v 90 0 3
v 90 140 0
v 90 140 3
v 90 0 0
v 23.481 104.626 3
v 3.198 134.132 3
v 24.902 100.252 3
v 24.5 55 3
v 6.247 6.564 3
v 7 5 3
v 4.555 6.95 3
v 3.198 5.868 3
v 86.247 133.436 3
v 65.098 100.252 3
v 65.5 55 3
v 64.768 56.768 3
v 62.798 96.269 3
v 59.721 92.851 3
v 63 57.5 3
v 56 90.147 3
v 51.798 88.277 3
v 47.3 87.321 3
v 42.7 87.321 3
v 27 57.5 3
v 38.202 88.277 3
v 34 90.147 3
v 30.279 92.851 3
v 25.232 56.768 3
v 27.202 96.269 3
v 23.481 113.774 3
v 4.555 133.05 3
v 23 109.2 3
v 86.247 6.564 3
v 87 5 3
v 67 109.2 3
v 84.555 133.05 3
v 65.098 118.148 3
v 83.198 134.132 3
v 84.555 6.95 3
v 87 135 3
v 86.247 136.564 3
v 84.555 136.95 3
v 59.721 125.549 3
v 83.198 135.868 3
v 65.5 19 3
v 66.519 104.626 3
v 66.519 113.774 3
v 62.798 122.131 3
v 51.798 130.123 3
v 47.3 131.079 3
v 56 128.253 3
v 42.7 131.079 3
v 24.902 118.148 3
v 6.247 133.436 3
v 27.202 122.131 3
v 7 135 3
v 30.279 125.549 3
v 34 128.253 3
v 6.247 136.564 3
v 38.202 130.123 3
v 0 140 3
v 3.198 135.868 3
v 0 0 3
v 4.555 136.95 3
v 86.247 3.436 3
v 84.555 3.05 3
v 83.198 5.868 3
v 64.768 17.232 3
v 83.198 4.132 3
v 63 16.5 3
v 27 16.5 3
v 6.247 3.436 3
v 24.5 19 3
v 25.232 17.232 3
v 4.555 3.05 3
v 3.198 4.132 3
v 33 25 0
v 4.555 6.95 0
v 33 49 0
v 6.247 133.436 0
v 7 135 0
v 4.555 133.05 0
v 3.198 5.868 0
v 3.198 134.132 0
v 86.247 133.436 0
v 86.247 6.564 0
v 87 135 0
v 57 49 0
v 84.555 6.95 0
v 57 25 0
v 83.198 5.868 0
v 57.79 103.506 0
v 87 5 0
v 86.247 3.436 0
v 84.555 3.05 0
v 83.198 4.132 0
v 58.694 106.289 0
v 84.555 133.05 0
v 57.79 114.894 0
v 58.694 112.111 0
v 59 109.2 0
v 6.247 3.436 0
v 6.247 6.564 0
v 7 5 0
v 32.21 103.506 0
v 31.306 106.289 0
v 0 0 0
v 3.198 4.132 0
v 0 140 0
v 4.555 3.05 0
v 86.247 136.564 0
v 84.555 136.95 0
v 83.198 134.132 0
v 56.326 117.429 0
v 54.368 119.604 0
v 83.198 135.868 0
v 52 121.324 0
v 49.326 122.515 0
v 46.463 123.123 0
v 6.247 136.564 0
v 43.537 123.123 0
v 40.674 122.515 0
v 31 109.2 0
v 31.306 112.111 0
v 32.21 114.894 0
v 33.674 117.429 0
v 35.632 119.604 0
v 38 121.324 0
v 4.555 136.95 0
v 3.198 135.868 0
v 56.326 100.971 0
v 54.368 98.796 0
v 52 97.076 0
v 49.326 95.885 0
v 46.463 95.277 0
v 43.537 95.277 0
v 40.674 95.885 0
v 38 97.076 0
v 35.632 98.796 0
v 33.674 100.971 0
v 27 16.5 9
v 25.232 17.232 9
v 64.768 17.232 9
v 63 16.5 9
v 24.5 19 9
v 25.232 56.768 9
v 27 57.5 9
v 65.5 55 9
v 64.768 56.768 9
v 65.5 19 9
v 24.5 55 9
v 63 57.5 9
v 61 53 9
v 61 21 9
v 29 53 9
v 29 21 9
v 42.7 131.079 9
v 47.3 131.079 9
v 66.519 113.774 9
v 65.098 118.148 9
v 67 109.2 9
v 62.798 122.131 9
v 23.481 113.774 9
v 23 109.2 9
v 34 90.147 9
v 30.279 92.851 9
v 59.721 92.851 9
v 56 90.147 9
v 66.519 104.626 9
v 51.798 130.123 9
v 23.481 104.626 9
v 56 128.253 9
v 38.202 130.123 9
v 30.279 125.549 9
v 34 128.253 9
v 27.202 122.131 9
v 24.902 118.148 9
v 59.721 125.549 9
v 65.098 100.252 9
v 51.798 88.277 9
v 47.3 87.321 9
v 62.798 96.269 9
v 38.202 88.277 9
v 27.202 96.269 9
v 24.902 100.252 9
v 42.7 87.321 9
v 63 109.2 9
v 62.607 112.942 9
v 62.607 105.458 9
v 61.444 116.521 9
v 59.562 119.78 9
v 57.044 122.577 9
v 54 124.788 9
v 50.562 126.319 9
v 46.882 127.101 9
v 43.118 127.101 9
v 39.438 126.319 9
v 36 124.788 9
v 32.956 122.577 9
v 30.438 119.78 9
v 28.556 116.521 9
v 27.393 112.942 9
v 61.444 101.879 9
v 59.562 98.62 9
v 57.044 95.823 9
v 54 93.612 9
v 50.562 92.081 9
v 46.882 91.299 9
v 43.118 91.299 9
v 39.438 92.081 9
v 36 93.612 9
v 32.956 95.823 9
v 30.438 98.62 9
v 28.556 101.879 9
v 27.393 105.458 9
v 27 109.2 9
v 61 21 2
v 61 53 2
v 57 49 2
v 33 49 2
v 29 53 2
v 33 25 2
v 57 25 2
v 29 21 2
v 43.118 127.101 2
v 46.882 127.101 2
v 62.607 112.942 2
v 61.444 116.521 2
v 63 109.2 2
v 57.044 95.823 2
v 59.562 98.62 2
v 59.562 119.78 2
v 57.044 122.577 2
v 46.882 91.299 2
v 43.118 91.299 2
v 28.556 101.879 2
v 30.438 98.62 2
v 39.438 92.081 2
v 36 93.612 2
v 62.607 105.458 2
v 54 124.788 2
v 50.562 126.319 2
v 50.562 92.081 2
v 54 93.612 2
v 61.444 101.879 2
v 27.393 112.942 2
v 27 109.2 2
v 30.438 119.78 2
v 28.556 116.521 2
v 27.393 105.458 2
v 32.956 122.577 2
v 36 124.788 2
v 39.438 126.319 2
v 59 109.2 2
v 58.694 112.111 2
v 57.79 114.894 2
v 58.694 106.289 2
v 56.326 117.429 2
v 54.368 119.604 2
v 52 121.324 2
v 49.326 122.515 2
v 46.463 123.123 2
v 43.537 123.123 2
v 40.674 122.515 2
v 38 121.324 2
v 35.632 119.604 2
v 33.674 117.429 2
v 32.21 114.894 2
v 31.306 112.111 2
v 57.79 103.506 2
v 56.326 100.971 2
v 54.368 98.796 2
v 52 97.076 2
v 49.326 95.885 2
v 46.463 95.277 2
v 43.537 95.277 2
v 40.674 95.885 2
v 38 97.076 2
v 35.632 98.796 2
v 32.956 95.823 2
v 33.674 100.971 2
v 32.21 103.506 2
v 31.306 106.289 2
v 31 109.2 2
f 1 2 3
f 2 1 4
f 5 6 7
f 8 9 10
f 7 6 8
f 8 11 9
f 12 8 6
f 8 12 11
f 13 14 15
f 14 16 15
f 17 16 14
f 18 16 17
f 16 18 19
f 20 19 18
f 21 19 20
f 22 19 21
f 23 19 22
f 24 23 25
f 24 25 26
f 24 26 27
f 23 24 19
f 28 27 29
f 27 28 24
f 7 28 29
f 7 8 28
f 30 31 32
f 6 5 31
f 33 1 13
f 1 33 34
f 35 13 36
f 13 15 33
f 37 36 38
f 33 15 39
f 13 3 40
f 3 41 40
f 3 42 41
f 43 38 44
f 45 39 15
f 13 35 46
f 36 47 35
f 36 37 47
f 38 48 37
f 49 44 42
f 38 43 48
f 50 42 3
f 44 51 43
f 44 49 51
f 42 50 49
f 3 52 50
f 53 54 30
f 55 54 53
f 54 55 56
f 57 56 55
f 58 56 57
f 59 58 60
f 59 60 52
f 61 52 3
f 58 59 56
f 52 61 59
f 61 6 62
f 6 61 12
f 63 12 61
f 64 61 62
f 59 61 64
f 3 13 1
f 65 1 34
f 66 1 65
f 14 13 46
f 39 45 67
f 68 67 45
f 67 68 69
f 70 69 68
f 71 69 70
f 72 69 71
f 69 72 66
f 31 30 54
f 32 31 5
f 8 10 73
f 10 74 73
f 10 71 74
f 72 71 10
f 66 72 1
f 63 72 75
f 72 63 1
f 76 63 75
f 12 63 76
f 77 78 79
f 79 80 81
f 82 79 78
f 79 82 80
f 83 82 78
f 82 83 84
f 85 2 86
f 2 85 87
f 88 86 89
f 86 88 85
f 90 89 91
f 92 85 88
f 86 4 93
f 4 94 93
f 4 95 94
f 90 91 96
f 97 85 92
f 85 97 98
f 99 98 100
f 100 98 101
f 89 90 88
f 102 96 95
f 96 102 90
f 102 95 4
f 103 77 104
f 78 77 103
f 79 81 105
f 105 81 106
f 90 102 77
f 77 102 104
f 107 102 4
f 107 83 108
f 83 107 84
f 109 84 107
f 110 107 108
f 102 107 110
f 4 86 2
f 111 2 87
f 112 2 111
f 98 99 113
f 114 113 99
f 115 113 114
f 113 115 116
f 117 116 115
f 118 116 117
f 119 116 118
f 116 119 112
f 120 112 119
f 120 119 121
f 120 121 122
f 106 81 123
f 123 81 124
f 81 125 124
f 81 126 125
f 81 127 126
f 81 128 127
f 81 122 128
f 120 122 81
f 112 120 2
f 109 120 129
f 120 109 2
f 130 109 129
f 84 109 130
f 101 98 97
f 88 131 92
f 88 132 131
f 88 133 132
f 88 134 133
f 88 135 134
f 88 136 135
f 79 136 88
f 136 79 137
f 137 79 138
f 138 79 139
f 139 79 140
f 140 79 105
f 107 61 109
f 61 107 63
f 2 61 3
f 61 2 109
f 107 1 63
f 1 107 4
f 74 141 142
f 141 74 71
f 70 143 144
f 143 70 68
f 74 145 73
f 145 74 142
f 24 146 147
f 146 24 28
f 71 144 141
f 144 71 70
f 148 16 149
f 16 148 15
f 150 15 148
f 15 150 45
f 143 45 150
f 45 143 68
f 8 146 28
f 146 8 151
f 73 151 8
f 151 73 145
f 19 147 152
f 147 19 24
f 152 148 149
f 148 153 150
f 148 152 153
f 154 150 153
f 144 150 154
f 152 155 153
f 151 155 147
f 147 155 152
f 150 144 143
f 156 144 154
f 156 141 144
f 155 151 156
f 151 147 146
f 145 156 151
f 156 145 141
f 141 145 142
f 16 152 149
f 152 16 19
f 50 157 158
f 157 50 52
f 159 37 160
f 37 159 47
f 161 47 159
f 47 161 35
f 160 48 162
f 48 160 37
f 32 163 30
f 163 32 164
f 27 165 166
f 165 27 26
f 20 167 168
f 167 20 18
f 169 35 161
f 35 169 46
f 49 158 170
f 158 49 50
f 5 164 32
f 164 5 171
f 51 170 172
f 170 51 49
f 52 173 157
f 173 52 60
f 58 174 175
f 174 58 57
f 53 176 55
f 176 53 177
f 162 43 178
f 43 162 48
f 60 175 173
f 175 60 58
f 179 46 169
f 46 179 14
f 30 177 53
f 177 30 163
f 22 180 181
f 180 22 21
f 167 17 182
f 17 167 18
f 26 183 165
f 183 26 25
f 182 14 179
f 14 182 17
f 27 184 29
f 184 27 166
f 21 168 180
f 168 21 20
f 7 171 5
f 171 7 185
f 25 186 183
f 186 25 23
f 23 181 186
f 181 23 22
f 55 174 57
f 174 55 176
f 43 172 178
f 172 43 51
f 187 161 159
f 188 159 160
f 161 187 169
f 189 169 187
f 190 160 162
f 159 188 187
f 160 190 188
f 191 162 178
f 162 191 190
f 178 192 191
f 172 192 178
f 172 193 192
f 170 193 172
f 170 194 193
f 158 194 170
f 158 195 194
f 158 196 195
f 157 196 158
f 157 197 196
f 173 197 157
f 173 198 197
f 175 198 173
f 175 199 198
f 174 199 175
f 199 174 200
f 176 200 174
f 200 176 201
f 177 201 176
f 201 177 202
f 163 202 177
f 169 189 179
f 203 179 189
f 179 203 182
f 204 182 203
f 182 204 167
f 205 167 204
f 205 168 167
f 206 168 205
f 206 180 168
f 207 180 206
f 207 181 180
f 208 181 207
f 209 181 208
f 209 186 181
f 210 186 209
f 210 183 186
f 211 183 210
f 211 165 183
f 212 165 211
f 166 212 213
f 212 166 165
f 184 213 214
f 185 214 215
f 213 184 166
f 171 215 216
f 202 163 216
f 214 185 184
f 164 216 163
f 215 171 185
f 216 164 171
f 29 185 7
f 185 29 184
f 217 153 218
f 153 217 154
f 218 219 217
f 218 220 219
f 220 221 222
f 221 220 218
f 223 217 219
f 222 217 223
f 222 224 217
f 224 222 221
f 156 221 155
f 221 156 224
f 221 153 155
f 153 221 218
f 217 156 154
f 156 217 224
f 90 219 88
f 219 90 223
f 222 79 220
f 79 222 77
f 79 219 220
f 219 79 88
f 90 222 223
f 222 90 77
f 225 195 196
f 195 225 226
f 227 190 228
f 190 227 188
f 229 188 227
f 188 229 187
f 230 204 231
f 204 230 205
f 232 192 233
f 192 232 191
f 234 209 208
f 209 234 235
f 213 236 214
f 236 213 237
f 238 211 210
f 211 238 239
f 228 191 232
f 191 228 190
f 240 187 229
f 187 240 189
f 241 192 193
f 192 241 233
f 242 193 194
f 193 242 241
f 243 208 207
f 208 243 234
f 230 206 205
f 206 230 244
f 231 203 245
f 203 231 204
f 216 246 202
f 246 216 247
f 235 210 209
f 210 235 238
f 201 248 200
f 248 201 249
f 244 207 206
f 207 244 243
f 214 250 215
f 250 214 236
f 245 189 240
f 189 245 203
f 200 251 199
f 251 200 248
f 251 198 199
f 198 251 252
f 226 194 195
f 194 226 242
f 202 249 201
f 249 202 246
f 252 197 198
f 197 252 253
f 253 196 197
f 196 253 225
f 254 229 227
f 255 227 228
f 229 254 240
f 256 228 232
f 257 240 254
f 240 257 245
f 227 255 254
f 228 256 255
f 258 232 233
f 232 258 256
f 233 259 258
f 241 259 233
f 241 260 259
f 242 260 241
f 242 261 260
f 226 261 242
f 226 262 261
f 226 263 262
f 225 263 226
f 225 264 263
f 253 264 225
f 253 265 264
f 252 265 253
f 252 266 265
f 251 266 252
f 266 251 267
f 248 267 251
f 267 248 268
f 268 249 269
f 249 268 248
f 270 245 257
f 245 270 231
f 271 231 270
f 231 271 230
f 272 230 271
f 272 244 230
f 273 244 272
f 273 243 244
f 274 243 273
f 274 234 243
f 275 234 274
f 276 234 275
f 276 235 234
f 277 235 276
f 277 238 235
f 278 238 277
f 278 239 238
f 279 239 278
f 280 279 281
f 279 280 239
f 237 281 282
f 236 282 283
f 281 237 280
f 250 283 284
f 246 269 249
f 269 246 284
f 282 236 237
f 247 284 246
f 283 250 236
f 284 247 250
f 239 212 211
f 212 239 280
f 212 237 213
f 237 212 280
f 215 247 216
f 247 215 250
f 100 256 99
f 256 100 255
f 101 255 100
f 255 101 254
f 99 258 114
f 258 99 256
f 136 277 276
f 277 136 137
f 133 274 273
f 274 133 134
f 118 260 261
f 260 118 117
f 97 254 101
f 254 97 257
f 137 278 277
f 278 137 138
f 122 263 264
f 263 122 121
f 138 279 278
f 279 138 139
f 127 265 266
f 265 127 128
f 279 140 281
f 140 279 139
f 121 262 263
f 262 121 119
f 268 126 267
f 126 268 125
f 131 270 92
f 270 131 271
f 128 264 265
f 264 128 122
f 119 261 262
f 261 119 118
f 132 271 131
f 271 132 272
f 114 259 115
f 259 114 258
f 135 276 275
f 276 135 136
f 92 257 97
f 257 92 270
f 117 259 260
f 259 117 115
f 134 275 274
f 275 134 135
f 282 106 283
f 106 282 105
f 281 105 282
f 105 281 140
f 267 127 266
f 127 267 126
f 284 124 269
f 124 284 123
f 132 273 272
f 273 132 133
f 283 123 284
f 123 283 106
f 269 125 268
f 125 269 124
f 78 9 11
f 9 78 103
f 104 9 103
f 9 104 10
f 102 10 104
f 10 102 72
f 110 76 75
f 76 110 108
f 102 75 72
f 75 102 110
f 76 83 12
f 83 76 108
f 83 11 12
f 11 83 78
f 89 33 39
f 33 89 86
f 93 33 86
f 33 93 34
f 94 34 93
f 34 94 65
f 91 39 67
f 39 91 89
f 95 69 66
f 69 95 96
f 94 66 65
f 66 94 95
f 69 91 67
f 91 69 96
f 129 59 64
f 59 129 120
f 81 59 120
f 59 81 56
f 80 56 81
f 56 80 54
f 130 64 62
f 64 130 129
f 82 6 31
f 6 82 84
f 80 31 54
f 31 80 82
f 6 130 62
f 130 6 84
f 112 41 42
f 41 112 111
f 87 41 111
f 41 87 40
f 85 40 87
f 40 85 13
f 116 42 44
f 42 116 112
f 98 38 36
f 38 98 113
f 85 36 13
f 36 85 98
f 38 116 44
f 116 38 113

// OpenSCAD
// file: params.scad
// Ansible widget cases
//
// Params: sets the we want
// -----------------------------------------------------------------------------

// Overall case
CASE_WIDTH = 90;
CASE_LENGTH = 140;
CASE_HEIGHT = 55;
WALL_THICKNESS = 3;
FLOOR_THICKNESS = WALL_THICKNESS;

// -----------------------------------------------------------------------------

// Front door
FRONT_DOOR_THICKNESS = 3;
FRONT_DOOR_INSET = 1;  // how much gap to give
FRONT_DOOR_OFFSET_Y = 4; // how far in from the edge
FRONT_DOOR_WIDTH = CASE_WIDTH - WALL_THICKNESS - FRONT_DOOR_INSET;
FRONT_DOOR_HEIGHT = CASE_HEIGHT - (WALL_THICKNESS * 2) + (FRONT_DOOR_INSET * 2);

// -----------------------------------------------------------------------------

// Pi shelf
SHELF_THICKNESS = WALL_THICKNESS - 1;
SHELF_Y = 52;
SHELF_LENGTH = 40;
SHELF_HEIGHT = 28;
SHELF_PEG_OFFSET_X = 3.5;
SHELF_PEG_OFFSET_Y = 3.0;
SHELF_PEG_HEIGHT = 8;
SHELF_PEG_RADIUS_BASE = 2.5;
SHELF_PEG_RADIUS_TOP = 1.5;

// -----------------------------------------------------------------------------

// Lid
LID_THICKNESS = WALL_THICKNESS;
DOCK_BORDER_HEIGHT = 9;
DOCK_BORDER_THICKNESS = 4;
DOCK_INSET = 2;

// Lid ridge
RIDGE_THICKNESS = WALL_THICKNESS * 2;
RIDGE_PEG_HEIGHT = 6;
RIDGE_PEG_RADIUS_BASE = 2.5;
RIDGE_PEG_RADIUS_TOP = 1.5;
RIDGE_PEG_RADIUS_HOLE = 2;
RIDGE_PEG_OFFSET = 5;

// -----------------------------------------------------------------------------

// General mount
MOUNT_HEIGHT = 15;
MOUNT_THICKNESS = 3;

// Selector dock
SELECTOR_DOCK_Y = CASE_LENGTH * .78;
SELECTOR_DOCK_RADIUS = 18;
SELECTOR_DOCK_BORDER_RADIUS = SELECTOR_DOCK_RADIUS + DOCK_BORDER_THICKNESS;
SELECTOR_HOLE_OFFSET = DOCK_BORDER_THICKNESS;
SELECTOR_HOLE_SIZE = SELECTOR_DOCK_RADIUS - SELECTOR_HOLE_OFFSET;

// Selector mount
SELECTOR_MOUNT_OFFSET = 0.5;
SELECTOR_MOUNT_RADIUS = SELECTOR_DOCK_RADIUS - SELECTOR_MOUNT_OFFSET;
SELECTOR_HOLE_RADIUS = SELECTOR_MOUNT_RADIUS - SELECTOR_HOLE_OFFSET;
SELECTOR_GRIP_HEIGHT = 5;
SELECTOR_GRIP_THICKNESS = 7;

// Widget dock
WIDGET_DOCK_Y = CASE_LENGTH * .15;
WIDGET_DOCK_SIZE = 32;
WIDGET_BORDER_RADIUS = 5/2;
WIDGET_HOLE_OFFSET = DOCK_BORDER_THICKNESS * 2;
WIDGET_HOLE_SIZE = WIDGET_DOCK_SIZE - WIDGET_HOLE_OFFSET;

// -----------------------------------------------------------------------------

// Pi
PI_COLOR = [0.3, 0.4, 0.3];
PI_Y = SHELF_Y + 5;
PI_WIDTH = 66.04;
PI_LENGTH = 30.48;
PI_DEPTH = 1.5;

// Battery pack
BATTERY_COLOR = [0.2, 0.2, 0.2];
BATTERY_WIDTH = 68.58;
BATTERY_LENGTH = 96.52;
BATTERY_DEPTH = 22.86;

// -----------------------------------------------------------------------------

// Magnet selector
MAGNET_PEG_HEIGHT = 7;
MAGNET_PEG_RADIUS_BASE = 2.5;
MAGNET_PEG_RADIUS_TOP = 1.5;
MAGNET_BASE_HEIGHT = 2;
MAGNET_BOARD_WIDTH = 23;
MAGNET_BOARD_HEIGHT = 21;
MAGNET_HOLE_WIDTH = MAGNET_BOARD_WIDTH - 5;
MAGNET_HOLE_LENGTH = 10;
MAGNET_BOARD_INSET = 1;
MAGNET_BOARD_INSET_WIDTH = MAGNET_BOARD_WIDTH + MAGNET_BOARD_INSET;
MAGNET_BOARD_INSET_HEIGHT = MAGNET_BOARD_HEIGHT + MAGNET_BOARD_INSET;
MAGNET_BOARD_INSET_DEPTH = 1;
// main file
// Ansible widget cases
//
// Lid: lid with selector/widget docks in it
// -----------------------------------------------------------------------------

include <params.scad>;

// -----------------------------------------------------------------------------

module lid() {
	// Cut out the inset and the connection holes
	difference() {
		// Union the lid and the borders
		union() {
			// Base lid
			cube([
				CASE_WIDTH,
				CASE_LENGTH,
				LID_THICKNESS
			]);
			
			// Widget/selector dock borders
			_widget_dock_border();
			_selector_dock_border();
		}
	   
		// Cut out the widget/selector dock inset and hole
		_widget_dock();
		_selector_dock();

		// Cut out the ridge peg holes
		_ridge_peg_holes();
	}
}

// -----------------------------------------------------------------------------

// Border for the widget dock
module _widget_dock_border() {
	translate([
		// Center it
		(CASE_WIDTH / 2) - (WIDGET_DOCK_SIZE / 2),
		// How far down the lid to put the dock
		WIDGET_DOCK_Y,
		0
	])
	linear_extrude(height=DOCK_BORDER_HEIGHT)
		hull() {
			translate([
				-DOCK_BORDER_THICKNESS / 2,
				-DOCK_BORDER_THICKNESS / 2,
				0
			])
				circle(r=WIDGET_BORDER_RADIUS);
		
			translate([
				WIDGET_DOCK_SIZE + DOCK_BORDER_THICKNESS / 2,
				-DOCK_BORDER_THICKNESS / 2,
				0
			])
				circle(r=WIDGET_BORDER_RADIUS);
		
			translate([
				-DOCK_BORDER_THICKNESS / 2,
				WIDGET_DOCK_SIZE + DOCK_BORDER_THICKNESS / 2,
				0
			])
				circle(r=WIDGET_BORDER_RADIUS);
		
			translate([
				WIDGET_DOCK_SIZE + DOCK_BORDER_THICKNESS / 2,
				WIDGET_DOCK_SIZE + DOCK_BORDER_THICKNESS / 2,
				0
			])
				circle(r=WIDGET_BORDER_RADIUS);
		}
}

// -----------------------------------------------------------------------------

// Border for the selector dock
module _selector_dock_border() {
	translate([
		// Center it
		CASE_WIDTH / 2,
		// How far down the lid to put the dock
		SELECTOR_DOCK_Y,
		0
	])
		cylinder(
			DOCK_BORDER_HEIGHT,
			SELECTOR_DOCK_BORDER_RADIUS,
			SELECTOR_DOCK_BORDER_RADIUS
		);
}

// -----------------------------------------------------------------------------

// Widget dock inset and hole
module _widget_dock() {
	// Cut out the widget dock inset
	translate([
		// Center it
		(CASE_WIDTH / 2) - (WIDGET_DOCK_SIZE / 2),
		// How far down the lid to put the inset
		WIDGET_DOCK_Y,
		// Leave some behind
		DOCK_INSET
	])
		cube([
			// Size of the dock
			WIDGET_DOCK_SIZE,
			WIDGET_DOCK_SIZE,
			// Add one so it cuts all the way through the top
			DOCK_BORDER_HEIGHT + 1
		]);
	
	// Cut out the widget dock connection hole
	translate([
		// Center it
		(CASE_WIDTH / 2) - (WIDGET_HOLE_SIZE / 2),
		// Center it within the dock
		WIDGET_DOCK_Y + (WIDGET_HOLE_OFFSET / 2),
		// Arbitrary, to make sure it cuts all the way through
		-5
	])
		cube([
			// Size of the hole
			WIDGET_HOLE_SIZE,
			WIDGET_HOLE_SIZE,
			// Arbitrary, to make sure it cuts all the way through
			10
		]);
}

// -----------------------------------------------------------------------------

// Selector dock inset and hole
module _selector_dock() {
	// Selection dock
	translate([
		// Center it
		CASE_WIDTH / 2,
		// How far down the lid to put the inset
		SELECTOR_DOCK_Y,
		// Leave some behind
		DOCK_INSET
	])
		cylinder(
			// Add one so it cuts all the way through the top
			DOCK_BORDER_HEIGHT + 1,
			// Size of the dock
			SELECTOR_DOCK_RADIUS,
			SELECTOR_DOCK_RADIUS
		);
	
	// Selection dock hole
	translate([
		// Center it
		CASE_WIDTH / 2,
		// How far down the lid to put the hole
		SELECTOR_DOCK_Y,
		// Arbitrary, to make sure it cuts all the way through
		-5
	])
		cylinder(
			// Arbitrary, to make sure it cuts all the way through
			10,
			// Size of the hole
			SELECTOR_HOLE_SIZE,
			SELECTOR_HOLE_SIZE
		);
}

// -----------------------------------------------------------------------------

// Ridge peg holes
module _ridge_peg_holes() {
	translate([
		RIDGE_PEG_OFFSET,
		RIDGE_PEG_OFFSET,
		// Add one to make sure it goes through
		-LID_THICKNESS + 1
	])
		cylinder(RIDGE_PEG_HEIGHT, RIDGE_PEG_RADIUS_HOLE, RIDGE_PEG_RADIUS_HOLE);

	translate([
		CASE_WIDTH - RIDGE_PEG_OFFSET,
		RIDGE_PEG_OFFSET,
		-LID_THICKNESS + 1
	])
		cylinder(RIDGE_PEG_HEIGHT, RIDGE_PEG_RADIUS_HOLE, RIDGE_PEG_RADIUS_HOLE);

	translate([
		RIDGE_PEG_OFFSET,
		CASE_LENGTH - RIDGE_PEG_OFFSET,
		-LID_THICKNESS + 1
	])
		cylinder(RIDGE_PEG_HEIGHT, RIDGE_PEG_RADIUS_HOLE, RIDGE_PEG_RADIUS_HOLE);

	translate([
		CASE_WIDTH - RIDGE_PEG_OFFSET,
		CASE_LENGTH - RIDGE_PEG_OFFSET,
		-LID_THICKNESS + 1
	])
		cylinder(RIDGE_PEG_HEIGHT, RIDGE_PEG_RADIUS_HOLE, RIDGE_PEG_RADIUS_HOLE);
}

// -----------------------------------------------------------------------------

lid();
